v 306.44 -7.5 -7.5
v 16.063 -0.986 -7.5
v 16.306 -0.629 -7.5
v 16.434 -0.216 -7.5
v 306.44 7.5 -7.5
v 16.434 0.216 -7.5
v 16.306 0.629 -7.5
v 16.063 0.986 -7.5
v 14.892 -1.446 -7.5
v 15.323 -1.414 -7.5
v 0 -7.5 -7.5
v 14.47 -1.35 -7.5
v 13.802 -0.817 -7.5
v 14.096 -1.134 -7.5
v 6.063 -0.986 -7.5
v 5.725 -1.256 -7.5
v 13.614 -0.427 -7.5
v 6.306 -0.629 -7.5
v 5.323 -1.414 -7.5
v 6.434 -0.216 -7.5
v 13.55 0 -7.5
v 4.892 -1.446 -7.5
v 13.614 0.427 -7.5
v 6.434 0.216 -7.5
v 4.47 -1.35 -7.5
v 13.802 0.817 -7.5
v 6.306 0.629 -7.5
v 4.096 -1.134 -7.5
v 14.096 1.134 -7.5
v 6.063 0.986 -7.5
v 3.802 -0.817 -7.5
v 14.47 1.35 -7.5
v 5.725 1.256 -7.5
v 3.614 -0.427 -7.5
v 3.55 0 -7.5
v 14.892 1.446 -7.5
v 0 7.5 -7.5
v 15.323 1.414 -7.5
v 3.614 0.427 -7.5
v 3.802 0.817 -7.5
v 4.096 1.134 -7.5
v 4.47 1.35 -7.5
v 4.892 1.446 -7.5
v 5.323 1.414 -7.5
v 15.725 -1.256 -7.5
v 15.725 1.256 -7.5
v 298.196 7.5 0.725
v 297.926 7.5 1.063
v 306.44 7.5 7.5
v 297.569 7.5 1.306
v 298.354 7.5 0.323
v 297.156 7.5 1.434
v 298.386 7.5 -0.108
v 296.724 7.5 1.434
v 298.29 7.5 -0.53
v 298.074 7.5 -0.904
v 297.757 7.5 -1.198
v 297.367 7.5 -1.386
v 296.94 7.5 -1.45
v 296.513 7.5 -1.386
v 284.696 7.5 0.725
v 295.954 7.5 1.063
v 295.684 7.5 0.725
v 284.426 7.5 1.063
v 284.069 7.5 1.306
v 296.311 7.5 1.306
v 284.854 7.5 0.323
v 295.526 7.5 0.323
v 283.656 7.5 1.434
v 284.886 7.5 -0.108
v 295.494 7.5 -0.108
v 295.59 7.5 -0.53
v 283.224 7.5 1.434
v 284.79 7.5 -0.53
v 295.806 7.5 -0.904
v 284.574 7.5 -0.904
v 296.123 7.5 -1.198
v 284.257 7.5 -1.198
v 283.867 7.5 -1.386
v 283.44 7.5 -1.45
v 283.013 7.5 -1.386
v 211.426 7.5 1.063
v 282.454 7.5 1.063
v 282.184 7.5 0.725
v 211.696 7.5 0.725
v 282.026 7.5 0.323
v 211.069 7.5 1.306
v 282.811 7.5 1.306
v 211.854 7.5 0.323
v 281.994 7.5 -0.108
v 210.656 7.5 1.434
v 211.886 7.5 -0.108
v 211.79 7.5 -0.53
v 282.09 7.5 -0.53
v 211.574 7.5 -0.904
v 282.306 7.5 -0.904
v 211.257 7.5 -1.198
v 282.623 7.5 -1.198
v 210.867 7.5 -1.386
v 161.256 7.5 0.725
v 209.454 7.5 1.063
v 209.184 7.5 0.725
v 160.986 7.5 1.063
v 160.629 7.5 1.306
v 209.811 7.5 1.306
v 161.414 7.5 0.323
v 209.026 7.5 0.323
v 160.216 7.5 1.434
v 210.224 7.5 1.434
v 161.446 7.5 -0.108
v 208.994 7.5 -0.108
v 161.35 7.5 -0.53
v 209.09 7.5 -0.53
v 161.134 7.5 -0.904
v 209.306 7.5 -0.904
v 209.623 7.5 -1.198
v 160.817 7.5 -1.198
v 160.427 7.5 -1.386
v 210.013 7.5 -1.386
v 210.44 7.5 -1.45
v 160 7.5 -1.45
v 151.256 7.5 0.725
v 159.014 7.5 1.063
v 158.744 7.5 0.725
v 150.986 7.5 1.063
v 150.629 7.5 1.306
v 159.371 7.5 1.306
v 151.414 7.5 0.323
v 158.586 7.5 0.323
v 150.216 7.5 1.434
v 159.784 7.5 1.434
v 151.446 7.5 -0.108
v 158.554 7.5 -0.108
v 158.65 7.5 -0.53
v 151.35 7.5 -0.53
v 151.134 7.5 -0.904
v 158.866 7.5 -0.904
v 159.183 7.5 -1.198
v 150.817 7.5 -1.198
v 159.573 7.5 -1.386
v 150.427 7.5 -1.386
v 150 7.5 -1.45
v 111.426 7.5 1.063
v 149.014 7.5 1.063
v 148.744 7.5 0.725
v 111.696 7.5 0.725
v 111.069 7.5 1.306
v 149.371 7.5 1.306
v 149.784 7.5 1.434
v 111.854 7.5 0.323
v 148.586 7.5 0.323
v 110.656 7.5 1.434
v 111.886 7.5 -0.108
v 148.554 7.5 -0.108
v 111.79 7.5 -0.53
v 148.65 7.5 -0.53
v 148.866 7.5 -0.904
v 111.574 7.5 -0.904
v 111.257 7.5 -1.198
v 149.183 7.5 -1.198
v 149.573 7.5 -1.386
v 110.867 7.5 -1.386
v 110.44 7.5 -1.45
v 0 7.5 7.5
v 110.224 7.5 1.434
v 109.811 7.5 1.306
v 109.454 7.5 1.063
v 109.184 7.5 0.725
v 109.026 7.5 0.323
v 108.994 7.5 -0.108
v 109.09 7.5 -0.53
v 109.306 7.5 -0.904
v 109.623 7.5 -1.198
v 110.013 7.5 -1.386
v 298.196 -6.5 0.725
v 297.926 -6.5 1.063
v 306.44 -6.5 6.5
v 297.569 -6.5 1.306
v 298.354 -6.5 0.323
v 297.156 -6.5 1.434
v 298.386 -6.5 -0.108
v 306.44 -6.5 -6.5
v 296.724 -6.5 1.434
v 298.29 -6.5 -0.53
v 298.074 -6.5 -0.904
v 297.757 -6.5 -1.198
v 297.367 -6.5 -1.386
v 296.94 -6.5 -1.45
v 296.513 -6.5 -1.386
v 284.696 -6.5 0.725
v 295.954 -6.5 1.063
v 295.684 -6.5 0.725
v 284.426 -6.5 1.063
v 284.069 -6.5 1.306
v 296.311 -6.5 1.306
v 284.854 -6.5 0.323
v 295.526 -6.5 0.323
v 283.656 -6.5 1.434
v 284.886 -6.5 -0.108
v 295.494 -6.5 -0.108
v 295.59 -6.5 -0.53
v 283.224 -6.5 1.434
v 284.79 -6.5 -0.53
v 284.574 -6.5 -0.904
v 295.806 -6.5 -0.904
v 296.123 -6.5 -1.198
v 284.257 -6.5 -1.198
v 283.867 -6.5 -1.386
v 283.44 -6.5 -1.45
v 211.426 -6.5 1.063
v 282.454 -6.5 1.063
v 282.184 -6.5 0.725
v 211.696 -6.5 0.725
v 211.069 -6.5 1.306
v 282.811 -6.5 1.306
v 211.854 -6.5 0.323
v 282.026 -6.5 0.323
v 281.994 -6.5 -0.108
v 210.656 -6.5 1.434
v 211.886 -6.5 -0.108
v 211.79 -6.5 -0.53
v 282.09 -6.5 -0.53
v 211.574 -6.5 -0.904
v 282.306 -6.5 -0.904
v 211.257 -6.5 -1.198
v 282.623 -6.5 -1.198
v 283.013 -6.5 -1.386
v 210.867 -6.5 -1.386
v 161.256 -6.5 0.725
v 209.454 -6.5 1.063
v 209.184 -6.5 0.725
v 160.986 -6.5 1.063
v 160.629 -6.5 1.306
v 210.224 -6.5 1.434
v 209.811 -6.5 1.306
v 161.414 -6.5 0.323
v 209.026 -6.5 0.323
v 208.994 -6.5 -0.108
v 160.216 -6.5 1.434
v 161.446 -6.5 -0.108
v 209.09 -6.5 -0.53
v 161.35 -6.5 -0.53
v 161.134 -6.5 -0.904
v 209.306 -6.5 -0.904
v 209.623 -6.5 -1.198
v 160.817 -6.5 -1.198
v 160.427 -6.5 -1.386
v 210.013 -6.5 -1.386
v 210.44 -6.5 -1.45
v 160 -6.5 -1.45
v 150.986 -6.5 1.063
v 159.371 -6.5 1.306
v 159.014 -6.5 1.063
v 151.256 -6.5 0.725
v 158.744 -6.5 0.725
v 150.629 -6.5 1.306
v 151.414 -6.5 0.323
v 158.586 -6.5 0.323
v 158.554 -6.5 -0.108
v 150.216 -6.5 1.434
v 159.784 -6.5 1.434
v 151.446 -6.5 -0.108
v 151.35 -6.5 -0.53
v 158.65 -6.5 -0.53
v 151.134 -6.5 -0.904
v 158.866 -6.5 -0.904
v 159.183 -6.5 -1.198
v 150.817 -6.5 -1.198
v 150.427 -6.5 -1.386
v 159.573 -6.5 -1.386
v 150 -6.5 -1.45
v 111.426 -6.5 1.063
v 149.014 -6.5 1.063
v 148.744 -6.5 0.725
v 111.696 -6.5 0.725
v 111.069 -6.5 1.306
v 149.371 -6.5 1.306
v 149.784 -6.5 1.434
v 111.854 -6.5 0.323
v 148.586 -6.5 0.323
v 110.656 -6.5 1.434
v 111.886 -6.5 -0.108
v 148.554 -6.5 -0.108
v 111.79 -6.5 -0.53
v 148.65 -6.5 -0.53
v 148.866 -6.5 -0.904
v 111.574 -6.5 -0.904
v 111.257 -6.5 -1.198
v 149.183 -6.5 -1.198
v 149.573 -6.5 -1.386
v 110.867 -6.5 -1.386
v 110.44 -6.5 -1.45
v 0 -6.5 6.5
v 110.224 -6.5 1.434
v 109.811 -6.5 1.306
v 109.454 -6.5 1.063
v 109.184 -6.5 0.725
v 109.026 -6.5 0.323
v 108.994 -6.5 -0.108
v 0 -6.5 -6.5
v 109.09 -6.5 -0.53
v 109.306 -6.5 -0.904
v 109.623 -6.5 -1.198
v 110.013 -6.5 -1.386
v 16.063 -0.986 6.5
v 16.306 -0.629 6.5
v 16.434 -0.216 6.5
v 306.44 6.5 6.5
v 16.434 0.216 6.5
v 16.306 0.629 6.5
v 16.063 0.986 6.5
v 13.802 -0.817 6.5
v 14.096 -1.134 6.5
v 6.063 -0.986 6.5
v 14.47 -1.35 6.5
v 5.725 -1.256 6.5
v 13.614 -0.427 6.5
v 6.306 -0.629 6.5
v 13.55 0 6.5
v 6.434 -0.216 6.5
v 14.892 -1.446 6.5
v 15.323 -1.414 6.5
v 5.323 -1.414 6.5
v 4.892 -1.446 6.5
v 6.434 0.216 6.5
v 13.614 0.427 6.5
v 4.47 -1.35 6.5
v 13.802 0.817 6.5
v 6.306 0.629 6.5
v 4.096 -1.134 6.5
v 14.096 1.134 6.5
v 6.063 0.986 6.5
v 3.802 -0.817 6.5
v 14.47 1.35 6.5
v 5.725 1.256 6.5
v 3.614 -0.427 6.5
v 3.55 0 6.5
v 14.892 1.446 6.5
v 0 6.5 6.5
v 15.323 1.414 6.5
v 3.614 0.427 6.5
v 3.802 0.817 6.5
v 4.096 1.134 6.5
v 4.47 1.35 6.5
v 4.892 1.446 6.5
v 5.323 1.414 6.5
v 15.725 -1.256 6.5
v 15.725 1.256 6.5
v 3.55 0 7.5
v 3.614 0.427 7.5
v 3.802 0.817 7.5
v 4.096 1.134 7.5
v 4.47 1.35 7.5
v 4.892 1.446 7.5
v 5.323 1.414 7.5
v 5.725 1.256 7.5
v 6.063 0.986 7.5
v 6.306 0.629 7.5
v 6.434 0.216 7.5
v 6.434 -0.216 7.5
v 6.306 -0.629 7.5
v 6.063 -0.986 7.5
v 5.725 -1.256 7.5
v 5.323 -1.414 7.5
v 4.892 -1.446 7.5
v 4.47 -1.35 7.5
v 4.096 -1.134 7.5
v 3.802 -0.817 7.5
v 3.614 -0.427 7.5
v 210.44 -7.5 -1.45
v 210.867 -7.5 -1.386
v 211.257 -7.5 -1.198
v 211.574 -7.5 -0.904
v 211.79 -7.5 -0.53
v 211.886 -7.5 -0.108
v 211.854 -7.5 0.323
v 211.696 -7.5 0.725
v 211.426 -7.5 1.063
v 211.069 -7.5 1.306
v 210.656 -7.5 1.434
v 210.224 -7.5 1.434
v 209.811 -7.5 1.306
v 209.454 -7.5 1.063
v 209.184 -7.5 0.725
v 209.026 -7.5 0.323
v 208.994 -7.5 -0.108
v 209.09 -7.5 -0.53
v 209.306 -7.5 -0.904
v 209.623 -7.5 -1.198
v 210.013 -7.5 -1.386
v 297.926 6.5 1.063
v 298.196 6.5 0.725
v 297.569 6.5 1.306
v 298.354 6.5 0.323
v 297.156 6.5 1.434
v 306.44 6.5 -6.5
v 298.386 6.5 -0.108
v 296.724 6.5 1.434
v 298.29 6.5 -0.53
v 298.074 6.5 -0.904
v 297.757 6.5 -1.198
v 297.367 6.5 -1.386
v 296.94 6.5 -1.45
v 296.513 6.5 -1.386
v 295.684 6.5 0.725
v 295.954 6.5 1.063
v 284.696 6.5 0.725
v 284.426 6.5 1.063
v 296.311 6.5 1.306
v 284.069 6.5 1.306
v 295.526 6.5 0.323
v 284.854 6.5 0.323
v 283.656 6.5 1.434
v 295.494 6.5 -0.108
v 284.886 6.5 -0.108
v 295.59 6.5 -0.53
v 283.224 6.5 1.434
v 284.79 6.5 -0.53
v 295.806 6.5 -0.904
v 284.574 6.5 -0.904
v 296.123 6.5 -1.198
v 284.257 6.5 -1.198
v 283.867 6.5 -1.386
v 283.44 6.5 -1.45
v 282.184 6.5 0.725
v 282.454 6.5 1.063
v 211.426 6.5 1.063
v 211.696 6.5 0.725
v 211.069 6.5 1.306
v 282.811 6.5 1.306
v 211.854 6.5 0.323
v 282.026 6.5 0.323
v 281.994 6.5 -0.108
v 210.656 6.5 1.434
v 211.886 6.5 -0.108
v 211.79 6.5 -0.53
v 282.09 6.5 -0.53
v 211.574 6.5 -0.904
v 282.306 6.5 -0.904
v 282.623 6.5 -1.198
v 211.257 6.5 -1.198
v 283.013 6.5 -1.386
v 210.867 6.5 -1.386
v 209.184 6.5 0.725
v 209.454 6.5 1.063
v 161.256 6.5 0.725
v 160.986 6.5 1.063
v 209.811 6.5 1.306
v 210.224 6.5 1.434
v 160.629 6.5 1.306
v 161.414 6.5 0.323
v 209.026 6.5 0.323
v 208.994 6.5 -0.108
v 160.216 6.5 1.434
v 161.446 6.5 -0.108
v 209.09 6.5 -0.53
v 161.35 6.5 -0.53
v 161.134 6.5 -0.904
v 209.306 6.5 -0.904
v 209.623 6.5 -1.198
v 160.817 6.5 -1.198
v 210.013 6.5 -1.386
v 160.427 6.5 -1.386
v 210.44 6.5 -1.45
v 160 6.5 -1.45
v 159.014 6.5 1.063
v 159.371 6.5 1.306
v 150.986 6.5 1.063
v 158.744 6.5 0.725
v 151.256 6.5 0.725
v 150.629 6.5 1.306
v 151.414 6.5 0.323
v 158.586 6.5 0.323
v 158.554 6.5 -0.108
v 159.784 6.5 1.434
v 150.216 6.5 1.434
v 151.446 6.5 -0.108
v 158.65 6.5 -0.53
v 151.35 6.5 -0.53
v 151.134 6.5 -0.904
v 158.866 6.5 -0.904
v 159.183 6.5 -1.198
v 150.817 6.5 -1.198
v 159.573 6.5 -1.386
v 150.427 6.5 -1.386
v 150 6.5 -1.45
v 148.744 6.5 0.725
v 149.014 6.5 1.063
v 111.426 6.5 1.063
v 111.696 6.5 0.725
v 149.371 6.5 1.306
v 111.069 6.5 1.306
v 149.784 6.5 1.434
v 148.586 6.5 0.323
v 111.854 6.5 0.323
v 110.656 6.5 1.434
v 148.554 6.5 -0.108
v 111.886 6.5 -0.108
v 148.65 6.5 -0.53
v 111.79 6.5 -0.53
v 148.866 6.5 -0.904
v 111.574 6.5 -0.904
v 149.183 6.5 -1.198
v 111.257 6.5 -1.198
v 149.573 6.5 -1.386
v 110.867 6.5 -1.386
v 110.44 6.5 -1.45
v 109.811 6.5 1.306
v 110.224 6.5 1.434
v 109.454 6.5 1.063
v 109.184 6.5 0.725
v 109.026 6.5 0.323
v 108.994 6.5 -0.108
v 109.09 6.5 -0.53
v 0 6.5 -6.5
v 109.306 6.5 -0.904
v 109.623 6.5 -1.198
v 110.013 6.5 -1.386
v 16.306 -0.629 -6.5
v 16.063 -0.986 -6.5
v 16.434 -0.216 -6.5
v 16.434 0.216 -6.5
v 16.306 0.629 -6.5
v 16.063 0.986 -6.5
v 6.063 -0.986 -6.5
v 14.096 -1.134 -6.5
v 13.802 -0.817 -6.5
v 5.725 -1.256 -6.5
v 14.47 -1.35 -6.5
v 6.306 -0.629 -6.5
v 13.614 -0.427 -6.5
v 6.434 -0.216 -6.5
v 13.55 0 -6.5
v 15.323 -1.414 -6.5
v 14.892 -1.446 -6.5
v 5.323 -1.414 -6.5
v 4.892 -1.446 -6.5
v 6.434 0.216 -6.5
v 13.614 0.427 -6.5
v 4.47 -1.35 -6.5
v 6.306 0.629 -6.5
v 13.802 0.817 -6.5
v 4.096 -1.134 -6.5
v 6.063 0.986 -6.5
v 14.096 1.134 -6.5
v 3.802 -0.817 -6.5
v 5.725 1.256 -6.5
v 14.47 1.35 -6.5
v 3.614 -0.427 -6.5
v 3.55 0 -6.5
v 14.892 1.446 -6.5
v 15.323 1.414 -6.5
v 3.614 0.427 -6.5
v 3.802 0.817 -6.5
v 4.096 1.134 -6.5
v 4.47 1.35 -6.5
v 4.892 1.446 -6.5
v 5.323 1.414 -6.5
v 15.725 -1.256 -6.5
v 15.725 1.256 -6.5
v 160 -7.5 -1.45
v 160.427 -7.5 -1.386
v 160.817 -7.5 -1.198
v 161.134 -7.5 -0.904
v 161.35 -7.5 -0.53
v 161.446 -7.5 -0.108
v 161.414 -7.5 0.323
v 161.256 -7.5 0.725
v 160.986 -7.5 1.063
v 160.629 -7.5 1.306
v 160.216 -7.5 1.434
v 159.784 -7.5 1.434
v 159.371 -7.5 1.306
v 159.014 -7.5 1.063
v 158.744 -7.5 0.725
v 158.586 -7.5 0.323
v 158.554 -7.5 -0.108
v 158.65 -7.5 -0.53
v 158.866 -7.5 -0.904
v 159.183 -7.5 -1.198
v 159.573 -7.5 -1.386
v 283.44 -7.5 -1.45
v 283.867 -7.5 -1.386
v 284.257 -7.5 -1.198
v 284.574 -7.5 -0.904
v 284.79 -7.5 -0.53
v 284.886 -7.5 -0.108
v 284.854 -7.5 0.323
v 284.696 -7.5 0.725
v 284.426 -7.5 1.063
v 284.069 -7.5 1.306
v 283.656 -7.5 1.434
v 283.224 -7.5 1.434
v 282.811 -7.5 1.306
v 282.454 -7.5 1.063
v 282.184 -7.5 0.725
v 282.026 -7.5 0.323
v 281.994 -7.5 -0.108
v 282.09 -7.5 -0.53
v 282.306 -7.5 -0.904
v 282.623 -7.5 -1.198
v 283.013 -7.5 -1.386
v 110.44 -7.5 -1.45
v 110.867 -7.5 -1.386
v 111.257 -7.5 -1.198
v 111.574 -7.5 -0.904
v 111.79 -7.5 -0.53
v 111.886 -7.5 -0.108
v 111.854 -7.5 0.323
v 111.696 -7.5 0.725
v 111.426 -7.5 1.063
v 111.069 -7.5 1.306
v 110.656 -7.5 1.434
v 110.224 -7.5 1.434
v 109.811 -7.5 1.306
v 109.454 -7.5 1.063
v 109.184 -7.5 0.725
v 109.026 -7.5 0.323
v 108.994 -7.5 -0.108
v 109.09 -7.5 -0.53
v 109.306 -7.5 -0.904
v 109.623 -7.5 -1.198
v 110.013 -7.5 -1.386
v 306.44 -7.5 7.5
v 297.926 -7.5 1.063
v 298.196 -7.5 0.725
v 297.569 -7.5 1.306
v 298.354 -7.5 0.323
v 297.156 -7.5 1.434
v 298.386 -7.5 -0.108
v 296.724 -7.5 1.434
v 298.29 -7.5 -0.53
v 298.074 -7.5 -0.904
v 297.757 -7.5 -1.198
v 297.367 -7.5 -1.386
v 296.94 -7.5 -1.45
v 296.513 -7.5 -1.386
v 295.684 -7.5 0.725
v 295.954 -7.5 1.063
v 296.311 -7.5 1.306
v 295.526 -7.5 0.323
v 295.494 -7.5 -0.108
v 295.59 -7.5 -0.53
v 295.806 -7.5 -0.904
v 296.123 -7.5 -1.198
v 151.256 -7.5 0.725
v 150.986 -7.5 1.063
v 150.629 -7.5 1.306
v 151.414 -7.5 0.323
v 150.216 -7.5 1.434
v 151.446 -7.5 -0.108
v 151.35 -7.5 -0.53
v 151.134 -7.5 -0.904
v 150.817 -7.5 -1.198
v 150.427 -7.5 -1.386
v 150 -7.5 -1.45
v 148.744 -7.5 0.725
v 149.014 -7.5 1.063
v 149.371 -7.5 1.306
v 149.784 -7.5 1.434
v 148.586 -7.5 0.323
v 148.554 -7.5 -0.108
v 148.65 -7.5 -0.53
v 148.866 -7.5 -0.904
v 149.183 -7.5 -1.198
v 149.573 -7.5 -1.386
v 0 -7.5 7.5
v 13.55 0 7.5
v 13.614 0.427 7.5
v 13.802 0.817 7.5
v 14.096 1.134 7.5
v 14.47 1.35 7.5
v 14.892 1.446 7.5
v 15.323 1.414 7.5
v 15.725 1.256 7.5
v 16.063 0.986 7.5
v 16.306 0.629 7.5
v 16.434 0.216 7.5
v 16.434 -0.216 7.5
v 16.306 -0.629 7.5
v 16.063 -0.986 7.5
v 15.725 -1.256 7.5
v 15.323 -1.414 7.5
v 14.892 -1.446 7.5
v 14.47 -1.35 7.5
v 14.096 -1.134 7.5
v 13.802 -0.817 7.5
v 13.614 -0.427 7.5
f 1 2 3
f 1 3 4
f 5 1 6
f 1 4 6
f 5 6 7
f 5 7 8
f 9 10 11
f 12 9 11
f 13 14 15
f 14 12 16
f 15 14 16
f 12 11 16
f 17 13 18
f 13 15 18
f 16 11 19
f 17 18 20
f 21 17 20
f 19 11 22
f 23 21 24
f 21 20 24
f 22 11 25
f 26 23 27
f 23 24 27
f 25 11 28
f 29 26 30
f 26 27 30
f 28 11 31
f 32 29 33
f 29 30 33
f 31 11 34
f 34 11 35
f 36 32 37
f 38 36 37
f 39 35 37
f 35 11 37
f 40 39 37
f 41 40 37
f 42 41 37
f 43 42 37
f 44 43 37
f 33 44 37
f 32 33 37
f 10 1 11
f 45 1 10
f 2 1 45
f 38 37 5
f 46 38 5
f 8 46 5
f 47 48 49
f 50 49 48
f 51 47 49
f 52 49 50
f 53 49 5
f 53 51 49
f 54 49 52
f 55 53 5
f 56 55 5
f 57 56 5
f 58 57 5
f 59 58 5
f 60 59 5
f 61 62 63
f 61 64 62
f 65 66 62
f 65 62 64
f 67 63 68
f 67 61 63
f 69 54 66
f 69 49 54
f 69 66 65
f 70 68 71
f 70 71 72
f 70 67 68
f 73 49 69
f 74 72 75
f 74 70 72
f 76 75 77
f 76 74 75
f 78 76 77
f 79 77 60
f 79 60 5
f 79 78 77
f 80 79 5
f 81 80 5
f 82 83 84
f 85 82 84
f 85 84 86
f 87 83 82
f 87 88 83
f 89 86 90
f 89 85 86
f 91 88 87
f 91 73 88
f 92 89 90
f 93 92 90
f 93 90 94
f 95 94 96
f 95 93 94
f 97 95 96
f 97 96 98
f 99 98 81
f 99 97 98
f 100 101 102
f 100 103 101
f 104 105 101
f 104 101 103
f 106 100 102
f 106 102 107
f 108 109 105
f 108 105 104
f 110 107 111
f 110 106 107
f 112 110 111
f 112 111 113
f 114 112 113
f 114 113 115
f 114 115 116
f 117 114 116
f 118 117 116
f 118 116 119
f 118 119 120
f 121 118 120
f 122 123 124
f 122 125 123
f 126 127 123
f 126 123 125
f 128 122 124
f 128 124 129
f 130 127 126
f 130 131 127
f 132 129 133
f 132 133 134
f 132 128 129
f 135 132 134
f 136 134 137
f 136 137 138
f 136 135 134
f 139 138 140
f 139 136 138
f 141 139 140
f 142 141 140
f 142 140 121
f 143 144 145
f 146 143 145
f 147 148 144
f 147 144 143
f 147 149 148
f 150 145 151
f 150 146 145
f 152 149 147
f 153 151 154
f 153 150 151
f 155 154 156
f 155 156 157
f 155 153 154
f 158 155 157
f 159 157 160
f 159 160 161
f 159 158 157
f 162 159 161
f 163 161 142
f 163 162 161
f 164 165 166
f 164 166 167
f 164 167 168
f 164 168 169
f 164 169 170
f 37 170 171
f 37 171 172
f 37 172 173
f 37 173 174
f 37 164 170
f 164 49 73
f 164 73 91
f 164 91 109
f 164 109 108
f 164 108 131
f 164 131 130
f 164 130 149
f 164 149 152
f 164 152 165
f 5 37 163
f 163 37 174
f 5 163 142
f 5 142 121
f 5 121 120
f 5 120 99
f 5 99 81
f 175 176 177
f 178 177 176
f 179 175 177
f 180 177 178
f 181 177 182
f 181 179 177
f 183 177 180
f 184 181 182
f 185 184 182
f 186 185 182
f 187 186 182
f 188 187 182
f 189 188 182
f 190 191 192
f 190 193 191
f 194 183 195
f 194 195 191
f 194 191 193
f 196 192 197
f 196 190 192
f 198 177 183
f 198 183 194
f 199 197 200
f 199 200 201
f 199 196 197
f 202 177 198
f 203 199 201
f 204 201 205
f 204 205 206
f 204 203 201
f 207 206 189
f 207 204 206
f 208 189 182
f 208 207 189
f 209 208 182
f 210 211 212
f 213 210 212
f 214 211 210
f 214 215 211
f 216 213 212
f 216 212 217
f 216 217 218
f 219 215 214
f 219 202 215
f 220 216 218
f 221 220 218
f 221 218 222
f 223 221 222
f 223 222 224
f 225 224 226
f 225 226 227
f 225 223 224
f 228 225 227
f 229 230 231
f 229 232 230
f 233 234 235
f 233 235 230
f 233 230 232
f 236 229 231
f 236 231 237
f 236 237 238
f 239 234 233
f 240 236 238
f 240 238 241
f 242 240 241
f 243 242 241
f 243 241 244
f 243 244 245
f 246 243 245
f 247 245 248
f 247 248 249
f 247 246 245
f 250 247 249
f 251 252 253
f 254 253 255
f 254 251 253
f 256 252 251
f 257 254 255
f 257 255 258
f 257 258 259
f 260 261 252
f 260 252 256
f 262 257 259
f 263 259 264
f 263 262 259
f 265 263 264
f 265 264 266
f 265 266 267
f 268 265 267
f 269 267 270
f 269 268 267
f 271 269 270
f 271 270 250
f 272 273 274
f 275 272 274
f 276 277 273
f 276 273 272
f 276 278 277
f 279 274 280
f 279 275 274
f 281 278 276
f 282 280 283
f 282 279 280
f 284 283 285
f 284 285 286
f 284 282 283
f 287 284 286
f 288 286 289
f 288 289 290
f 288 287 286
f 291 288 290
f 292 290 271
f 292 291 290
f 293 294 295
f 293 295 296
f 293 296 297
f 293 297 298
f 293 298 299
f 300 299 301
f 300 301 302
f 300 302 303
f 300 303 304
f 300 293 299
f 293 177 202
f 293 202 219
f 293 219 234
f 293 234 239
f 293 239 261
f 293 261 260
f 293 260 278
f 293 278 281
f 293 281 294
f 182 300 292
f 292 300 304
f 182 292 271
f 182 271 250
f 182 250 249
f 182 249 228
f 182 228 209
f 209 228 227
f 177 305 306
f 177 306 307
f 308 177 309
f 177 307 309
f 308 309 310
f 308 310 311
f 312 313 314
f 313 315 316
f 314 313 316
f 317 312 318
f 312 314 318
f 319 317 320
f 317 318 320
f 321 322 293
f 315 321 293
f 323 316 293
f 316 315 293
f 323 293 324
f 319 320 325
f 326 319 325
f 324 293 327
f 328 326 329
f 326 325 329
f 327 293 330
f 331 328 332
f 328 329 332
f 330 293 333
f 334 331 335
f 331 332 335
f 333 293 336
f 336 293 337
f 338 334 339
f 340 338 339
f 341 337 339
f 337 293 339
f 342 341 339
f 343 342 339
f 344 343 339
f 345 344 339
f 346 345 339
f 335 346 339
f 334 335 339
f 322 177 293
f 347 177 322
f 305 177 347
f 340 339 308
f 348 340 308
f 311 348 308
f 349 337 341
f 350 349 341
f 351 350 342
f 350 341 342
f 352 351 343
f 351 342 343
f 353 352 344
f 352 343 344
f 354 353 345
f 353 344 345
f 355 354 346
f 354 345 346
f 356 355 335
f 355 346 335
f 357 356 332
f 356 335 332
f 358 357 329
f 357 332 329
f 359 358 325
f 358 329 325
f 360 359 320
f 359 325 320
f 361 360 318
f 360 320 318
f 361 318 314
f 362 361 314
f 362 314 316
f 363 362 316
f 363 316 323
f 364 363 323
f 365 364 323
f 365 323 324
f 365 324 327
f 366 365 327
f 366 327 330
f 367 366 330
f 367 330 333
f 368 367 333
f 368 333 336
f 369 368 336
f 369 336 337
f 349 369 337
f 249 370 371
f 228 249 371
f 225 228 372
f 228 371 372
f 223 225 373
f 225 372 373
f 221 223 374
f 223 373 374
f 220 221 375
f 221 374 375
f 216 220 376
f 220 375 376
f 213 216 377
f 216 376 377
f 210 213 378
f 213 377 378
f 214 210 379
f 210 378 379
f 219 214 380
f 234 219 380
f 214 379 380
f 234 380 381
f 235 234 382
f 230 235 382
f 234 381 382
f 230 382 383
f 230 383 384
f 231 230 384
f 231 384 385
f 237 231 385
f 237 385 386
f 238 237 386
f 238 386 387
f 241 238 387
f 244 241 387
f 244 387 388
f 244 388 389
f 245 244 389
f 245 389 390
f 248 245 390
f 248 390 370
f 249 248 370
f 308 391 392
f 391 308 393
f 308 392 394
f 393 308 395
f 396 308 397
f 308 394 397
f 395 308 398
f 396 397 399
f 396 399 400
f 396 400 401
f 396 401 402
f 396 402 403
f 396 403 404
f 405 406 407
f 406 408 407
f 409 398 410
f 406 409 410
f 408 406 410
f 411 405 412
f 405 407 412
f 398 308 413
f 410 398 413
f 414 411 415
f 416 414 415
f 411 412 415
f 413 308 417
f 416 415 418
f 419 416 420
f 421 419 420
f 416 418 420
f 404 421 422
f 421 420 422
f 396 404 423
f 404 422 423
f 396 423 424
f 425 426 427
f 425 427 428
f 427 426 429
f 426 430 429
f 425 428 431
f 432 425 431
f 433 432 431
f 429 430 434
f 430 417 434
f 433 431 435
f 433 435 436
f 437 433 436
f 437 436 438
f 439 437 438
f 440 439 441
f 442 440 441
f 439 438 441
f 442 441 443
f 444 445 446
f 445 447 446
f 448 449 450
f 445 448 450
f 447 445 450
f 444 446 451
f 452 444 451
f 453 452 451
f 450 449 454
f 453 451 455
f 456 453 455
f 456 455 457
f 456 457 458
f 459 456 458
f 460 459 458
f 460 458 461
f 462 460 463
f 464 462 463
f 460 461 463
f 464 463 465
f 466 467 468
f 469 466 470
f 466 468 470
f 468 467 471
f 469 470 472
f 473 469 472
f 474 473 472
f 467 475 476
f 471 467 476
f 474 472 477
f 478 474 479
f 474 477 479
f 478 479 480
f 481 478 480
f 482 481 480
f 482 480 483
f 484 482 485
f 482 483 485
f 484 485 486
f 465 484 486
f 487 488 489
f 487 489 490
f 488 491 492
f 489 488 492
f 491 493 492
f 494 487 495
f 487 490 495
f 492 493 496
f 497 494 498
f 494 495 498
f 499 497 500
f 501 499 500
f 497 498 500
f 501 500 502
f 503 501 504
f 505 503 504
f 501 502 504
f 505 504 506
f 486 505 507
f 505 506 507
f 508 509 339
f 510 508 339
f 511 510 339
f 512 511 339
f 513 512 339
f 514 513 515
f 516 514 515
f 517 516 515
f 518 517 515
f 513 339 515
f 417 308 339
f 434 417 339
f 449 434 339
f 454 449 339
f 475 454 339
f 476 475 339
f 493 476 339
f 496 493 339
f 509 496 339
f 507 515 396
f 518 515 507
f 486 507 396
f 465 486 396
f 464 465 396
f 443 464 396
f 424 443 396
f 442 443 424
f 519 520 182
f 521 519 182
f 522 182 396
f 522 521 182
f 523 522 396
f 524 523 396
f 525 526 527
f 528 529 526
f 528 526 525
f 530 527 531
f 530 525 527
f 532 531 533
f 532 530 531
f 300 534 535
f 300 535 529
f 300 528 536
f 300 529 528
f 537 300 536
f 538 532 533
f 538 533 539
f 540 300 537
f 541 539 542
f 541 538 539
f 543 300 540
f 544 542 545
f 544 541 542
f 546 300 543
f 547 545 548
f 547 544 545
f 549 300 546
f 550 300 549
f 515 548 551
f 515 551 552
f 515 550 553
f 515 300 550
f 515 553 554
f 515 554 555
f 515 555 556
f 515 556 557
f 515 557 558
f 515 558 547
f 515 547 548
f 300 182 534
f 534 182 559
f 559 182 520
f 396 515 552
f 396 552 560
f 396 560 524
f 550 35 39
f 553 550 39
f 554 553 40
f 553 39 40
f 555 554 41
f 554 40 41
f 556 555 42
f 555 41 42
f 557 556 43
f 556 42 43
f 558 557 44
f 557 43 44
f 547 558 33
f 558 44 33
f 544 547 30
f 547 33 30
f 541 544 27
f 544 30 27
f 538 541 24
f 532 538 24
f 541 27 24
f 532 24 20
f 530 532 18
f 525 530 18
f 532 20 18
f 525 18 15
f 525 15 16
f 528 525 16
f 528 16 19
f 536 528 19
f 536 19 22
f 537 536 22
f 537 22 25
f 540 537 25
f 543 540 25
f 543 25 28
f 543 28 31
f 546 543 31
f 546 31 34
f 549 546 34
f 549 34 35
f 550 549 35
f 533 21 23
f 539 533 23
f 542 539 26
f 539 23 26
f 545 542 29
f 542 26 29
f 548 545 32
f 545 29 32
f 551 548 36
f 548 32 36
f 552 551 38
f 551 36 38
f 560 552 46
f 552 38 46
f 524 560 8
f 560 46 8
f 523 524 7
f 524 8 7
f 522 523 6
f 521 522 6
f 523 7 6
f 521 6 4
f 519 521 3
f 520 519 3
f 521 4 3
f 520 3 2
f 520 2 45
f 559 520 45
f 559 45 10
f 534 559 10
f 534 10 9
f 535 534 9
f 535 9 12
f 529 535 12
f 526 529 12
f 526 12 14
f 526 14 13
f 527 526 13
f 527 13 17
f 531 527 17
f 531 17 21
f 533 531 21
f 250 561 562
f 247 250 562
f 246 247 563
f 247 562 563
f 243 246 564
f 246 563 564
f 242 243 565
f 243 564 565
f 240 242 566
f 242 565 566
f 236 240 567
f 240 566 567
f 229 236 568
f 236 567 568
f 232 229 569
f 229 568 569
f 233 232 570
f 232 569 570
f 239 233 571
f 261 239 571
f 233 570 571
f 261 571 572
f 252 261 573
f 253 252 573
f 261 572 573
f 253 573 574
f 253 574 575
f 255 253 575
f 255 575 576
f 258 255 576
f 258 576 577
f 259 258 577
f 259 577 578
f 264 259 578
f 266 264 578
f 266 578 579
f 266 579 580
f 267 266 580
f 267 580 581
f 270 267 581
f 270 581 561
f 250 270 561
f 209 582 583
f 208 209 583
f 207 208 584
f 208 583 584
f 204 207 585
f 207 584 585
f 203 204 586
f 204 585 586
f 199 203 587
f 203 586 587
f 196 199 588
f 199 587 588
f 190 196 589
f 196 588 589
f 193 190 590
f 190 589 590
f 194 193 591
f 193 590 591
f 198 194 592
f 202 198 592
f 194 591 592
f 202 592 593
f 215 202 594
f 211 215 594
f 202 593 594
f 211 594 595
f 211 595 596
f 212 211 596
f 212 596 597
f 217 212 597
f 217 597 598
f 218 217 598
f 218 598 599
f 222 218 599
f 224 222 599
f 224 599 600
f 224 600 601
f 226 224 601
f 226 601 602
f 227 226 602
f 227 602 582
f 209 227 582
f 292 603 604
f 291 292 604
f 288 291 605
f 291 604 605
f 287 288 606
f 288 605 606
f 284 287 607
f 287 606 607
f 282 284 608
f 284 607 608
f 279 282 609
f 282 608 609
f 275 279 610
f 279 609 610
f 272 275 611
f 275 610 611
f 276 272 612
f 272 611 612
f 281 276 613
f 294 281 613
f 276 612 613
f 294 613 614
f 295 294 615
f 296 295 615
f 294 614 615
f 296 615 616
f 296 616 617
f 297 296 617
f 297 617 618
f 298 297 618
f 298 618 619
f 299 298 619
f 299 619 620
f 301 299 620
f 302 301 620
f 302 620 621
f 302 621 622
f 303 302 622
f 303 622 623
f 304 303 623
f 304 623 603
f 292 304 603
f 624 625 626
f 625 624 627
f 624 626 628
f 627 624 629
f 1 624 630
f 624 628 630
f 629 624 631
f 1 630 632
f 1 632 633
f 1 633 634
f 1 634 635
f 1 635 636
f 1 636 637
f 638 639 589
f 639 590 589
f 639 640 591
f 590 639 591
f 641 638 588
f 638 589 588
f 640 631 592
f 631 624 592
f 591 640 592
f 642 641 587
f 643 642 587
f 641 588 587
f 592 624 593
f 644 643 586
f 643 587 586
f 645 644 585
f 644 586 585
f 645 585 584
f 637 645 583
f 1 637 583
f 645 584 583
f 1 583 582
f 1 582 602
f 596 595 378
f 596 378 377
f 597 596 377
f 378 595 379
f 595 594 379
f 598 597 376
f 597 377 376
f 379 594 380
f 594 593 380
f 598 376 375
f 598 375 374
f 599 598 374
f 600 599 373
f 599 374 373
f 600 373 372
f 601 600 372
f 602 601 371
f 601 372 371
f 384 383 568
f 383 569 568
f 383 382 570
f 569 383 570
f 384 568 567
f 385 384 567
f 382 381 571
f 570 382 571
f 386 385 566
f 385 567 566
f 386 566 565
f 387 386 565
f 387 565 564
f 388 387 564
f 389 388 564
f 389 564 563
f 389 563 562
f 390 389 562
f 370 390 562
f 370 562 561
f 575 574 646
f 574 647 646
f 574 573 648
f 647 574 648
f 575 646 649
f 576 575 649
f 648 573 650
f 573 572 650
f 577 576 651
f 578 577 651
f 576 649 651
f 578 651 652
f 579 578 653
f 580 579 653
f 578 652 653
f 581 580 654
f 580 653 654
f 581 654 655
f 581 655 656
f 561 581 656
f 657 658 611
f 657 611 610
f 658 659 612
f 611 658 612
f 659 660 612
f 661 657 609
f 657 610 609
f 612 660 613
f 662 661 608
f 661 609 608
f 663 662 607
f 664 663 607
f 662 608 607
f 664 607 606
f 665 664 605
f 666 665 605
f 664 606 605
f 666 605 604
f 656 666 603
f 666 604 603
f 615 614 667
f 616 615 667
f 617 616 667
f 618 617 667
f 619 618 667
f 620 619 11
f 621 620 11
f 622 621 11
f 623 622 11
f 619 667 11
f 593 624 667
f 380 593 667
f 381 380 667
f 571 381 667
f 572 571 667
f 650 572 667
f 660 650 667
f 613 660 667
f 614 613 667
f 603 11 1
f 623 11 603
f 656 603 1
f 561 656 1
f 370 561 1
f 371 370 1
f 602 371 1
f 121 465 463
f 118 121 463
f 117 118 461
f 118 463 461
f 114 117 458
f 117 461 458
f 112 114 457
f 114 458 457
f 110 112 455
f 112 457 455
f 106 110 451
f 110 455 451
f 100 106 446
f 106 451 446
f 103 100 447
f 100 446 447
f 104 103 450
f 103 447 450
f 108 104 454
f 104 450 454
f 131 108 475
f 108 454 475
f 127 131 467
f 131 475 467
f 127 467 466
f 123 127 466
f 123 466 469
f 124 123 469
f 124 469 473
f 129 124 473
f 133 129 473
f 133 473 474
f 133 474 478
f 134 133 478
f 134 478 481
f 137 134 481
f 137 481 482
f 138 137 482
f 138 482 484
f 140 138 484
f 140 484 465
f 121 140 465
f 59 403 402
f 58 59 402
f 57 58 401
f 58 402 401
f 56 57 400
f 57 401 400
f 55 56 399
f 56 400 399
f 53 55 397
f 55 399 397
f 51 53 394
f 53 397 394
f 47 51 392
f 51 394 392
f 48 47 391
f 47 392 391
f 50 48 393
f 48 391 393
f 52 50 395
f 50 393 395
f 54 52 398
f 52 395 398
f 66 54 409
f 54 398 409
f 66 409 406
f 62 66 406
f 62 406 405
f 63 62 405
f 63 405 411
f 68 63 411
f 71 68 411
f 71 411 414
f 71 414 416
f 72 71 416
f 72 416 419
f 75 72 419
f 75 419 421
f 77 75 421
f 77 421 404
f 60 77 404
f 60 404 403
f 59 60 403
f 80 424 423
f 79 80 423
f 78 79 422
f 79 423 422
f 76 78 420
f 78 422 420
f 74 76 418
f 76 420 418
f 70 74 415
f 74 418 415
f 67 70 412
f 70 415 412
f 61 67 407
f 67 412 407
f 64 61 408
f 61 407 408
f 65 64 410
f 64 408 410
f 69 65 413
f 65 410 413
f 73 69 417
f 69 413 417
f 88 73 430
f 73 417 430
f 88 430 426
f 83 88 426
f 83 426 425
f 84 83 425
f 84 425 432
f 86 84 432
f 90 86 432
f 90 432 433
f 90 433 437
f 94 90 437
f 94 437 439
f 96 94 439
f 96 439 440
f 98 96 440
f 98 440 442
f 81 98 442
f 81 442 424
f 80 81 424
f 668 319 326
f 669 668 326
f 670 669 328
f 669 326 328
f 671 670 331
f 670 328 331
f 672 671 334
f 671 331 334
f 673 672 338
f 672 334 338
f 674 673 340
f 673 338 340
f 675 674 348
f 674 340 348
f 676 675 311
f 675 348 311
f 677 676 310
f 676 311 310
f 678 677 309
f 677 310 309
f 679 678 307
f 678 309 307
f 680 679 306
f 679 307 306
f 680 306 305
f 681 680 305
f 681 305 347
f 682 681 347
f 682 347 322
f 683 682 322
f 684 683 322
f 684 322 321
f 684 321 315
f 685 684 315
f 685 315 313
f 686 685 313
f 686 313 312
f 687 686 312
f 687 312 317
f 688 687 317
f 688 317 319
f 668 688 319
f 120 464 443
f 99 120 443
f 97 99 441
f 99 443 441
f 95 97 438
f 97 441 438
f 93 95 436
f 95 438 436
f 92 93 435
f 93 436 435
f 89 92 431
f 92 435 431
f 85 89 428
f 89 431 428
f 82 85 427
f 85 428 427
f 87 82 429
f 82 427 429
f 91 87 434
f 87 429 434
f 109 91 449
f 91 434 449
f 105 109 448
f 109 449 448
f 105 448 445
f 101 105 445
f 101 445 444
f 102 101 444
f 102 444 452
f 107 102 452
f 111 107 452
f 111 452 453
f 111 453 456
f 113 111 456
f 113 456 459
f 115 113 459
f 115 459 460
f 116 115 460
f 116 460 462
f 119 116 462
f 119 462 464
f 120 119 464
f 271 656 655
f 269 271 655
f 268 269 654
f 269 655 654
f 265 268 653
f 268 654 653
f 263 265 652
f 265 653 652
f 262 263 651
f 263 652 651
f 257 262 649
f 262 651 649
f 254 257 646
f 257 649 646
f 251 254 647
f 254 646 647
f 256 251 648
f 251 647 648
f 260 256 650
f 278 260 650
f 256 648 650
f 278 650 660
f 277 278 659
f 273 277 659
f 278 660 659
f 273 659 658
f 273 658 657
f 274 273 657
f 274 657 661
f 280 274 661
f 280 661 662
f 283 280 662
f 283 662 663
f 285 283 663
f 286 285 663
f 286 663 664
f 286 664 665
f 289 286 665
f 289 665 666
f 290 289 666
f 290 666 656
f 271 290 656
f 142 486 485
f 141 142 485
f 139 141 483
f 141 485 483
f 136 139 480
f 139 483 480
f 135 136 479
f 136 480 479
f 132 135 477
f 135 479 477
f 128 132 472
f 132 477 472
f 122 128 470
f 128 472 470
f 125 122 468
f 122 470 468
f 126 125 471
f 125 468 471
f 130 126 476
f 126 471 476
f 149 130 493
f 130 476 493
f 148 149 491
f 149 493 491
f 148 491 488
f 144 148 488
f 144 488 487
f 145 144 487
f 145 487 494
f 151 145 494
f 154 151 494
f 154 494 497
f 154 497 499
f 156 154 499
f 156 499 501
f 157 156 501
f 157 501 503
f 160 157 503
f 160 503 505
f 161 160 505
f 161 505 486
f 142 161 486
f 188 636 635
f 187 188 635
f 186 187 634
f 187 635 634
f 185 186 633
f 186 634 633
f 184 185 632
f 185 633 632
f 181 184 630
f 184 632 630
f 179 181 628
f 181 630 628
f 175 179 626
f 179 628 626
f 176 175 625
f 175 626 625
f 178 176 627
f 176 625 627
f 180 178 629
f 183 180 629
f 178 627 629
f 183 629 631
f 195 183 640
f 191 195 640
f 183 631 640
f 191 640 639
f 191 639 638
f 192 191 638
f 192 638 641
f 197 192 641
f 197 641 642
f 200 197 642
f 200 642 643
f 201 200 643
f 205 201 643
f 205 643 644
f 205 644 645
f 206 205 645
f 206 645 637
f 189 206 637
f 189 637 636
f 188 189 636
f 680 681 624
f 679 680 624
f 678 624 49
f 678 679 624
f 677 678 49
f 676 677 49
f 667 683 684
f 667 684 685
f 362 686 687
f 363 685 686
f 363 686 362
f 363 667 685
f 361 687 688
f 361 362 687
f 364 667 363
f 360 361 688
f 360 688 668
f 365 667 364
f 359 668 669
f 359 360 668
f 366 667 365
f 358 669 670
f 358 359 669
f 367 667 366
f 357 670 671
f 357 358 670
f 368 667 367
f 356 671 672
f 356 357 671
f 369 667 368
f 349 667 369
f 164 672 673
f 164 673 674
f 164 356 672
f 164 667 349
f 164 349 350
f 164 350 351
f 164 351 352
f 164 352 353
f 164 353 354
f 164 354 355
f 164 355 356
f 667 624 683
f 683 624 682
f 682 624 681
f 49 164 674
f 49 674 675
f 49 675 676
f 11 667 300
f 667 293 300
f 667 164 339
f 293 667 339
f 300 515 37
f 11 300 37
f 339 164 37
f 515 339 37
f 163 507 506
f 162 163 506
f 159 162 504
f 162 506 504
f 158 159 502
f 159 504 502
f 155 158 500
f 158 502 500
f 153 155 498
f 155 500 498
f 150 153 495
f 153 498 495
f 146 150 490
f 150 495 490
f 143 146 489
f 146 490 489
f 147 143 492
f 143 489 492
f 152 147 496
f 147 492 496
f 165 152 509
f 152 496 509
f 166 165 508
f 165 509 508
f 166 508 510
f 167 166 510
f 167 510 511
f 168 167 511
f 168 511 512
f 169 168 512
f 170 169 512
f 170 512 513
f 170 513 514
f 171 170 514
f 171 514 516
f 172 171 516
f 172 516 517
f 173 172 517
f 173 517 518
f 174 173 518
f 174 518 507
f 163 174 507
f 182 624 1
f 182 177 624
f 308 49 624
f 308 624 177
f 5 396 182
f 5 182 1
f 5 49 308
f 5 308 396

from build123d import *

# Parameters (mm, degrees)
SKETCH_1_W          = 15
SKETCH_1_H          = 15
SKETCH_1_W_2        = 13
SKETCH_1_H_2        = 13
EXTRUDE_1_DEPTH     = 306.44
SKETCH_2_R          = 1.45
CUT_EXTRUDE_1_DEPTH = 307.898555878
SKETCH_3_R          = 1.45
CUT_EXTRUDE_2_DEPTH = 307.898555878


with BuildPart() as part:
    # 草图1 → 凸台-拉伸1 (new body)
    with BuildSketch(Plane(origin=(0, 0, 0), x_dir=(0, 0, -1), z_dir=(1, 0, 0))):
        Rectangle(SKETCH_1_W, SKETCH_1_H)
        Rectangle(SKETCH_1_W_2, SKETCH_1_H_2, mode=Mode.SUBTRACT)
    extrude(amount=EXTRUDE_1_DEPTH)

    # 草图2 → 切除-拉伸1 (cut, through all)
    with BuildSketch(Plane.XZ.offset(7.5)):
        with Locations(Location((110.44, 0, 0), (0, 0, 270))):
            Circle(SKETCH_2_R)
        with Locations(Location((210.44, 0, 0), (0, 0, 270))):
            Circle(SKETCH_2_R)
        with Locations(Location((283.44, 0, 0), (0, 0, 270))):
            Circle(SKETCH_2_R)
        with Locations(Location((296.94, 0, 0), (0, 0, 270))):
            Circle(SKETCH_2_R)
        with Locations(Location((150, 0, 0), (0, 0, 270))):
            Circle(SKETCH_2_R)
        with Locations(Location((160, 0, 0), (0, 0, 270))):
            Circle(SKETCH_2_R)
    extrude(amount=-CUT_EXTRUDE_1_DEPTH, mode=Mode.SUBTRACT)

    # 草图3 → 切除-拉伸2 (cut, through all)
    with BuildSketch(Plane(origin=(0, 0, -7.5), x_dir=(-1, 0, 0), z_dir=(0, 0, -1))):
        with Locations((-5, 0)):
            Circle(SKETCH_3_R)
        with Locations((-15, 0)):
            Circle(SKETCH_3_R)
    extrude(amount=-CUT_EXTRUDE_2_DEPTH, mode=Mode.SUBTRACT)


solid = part.part
